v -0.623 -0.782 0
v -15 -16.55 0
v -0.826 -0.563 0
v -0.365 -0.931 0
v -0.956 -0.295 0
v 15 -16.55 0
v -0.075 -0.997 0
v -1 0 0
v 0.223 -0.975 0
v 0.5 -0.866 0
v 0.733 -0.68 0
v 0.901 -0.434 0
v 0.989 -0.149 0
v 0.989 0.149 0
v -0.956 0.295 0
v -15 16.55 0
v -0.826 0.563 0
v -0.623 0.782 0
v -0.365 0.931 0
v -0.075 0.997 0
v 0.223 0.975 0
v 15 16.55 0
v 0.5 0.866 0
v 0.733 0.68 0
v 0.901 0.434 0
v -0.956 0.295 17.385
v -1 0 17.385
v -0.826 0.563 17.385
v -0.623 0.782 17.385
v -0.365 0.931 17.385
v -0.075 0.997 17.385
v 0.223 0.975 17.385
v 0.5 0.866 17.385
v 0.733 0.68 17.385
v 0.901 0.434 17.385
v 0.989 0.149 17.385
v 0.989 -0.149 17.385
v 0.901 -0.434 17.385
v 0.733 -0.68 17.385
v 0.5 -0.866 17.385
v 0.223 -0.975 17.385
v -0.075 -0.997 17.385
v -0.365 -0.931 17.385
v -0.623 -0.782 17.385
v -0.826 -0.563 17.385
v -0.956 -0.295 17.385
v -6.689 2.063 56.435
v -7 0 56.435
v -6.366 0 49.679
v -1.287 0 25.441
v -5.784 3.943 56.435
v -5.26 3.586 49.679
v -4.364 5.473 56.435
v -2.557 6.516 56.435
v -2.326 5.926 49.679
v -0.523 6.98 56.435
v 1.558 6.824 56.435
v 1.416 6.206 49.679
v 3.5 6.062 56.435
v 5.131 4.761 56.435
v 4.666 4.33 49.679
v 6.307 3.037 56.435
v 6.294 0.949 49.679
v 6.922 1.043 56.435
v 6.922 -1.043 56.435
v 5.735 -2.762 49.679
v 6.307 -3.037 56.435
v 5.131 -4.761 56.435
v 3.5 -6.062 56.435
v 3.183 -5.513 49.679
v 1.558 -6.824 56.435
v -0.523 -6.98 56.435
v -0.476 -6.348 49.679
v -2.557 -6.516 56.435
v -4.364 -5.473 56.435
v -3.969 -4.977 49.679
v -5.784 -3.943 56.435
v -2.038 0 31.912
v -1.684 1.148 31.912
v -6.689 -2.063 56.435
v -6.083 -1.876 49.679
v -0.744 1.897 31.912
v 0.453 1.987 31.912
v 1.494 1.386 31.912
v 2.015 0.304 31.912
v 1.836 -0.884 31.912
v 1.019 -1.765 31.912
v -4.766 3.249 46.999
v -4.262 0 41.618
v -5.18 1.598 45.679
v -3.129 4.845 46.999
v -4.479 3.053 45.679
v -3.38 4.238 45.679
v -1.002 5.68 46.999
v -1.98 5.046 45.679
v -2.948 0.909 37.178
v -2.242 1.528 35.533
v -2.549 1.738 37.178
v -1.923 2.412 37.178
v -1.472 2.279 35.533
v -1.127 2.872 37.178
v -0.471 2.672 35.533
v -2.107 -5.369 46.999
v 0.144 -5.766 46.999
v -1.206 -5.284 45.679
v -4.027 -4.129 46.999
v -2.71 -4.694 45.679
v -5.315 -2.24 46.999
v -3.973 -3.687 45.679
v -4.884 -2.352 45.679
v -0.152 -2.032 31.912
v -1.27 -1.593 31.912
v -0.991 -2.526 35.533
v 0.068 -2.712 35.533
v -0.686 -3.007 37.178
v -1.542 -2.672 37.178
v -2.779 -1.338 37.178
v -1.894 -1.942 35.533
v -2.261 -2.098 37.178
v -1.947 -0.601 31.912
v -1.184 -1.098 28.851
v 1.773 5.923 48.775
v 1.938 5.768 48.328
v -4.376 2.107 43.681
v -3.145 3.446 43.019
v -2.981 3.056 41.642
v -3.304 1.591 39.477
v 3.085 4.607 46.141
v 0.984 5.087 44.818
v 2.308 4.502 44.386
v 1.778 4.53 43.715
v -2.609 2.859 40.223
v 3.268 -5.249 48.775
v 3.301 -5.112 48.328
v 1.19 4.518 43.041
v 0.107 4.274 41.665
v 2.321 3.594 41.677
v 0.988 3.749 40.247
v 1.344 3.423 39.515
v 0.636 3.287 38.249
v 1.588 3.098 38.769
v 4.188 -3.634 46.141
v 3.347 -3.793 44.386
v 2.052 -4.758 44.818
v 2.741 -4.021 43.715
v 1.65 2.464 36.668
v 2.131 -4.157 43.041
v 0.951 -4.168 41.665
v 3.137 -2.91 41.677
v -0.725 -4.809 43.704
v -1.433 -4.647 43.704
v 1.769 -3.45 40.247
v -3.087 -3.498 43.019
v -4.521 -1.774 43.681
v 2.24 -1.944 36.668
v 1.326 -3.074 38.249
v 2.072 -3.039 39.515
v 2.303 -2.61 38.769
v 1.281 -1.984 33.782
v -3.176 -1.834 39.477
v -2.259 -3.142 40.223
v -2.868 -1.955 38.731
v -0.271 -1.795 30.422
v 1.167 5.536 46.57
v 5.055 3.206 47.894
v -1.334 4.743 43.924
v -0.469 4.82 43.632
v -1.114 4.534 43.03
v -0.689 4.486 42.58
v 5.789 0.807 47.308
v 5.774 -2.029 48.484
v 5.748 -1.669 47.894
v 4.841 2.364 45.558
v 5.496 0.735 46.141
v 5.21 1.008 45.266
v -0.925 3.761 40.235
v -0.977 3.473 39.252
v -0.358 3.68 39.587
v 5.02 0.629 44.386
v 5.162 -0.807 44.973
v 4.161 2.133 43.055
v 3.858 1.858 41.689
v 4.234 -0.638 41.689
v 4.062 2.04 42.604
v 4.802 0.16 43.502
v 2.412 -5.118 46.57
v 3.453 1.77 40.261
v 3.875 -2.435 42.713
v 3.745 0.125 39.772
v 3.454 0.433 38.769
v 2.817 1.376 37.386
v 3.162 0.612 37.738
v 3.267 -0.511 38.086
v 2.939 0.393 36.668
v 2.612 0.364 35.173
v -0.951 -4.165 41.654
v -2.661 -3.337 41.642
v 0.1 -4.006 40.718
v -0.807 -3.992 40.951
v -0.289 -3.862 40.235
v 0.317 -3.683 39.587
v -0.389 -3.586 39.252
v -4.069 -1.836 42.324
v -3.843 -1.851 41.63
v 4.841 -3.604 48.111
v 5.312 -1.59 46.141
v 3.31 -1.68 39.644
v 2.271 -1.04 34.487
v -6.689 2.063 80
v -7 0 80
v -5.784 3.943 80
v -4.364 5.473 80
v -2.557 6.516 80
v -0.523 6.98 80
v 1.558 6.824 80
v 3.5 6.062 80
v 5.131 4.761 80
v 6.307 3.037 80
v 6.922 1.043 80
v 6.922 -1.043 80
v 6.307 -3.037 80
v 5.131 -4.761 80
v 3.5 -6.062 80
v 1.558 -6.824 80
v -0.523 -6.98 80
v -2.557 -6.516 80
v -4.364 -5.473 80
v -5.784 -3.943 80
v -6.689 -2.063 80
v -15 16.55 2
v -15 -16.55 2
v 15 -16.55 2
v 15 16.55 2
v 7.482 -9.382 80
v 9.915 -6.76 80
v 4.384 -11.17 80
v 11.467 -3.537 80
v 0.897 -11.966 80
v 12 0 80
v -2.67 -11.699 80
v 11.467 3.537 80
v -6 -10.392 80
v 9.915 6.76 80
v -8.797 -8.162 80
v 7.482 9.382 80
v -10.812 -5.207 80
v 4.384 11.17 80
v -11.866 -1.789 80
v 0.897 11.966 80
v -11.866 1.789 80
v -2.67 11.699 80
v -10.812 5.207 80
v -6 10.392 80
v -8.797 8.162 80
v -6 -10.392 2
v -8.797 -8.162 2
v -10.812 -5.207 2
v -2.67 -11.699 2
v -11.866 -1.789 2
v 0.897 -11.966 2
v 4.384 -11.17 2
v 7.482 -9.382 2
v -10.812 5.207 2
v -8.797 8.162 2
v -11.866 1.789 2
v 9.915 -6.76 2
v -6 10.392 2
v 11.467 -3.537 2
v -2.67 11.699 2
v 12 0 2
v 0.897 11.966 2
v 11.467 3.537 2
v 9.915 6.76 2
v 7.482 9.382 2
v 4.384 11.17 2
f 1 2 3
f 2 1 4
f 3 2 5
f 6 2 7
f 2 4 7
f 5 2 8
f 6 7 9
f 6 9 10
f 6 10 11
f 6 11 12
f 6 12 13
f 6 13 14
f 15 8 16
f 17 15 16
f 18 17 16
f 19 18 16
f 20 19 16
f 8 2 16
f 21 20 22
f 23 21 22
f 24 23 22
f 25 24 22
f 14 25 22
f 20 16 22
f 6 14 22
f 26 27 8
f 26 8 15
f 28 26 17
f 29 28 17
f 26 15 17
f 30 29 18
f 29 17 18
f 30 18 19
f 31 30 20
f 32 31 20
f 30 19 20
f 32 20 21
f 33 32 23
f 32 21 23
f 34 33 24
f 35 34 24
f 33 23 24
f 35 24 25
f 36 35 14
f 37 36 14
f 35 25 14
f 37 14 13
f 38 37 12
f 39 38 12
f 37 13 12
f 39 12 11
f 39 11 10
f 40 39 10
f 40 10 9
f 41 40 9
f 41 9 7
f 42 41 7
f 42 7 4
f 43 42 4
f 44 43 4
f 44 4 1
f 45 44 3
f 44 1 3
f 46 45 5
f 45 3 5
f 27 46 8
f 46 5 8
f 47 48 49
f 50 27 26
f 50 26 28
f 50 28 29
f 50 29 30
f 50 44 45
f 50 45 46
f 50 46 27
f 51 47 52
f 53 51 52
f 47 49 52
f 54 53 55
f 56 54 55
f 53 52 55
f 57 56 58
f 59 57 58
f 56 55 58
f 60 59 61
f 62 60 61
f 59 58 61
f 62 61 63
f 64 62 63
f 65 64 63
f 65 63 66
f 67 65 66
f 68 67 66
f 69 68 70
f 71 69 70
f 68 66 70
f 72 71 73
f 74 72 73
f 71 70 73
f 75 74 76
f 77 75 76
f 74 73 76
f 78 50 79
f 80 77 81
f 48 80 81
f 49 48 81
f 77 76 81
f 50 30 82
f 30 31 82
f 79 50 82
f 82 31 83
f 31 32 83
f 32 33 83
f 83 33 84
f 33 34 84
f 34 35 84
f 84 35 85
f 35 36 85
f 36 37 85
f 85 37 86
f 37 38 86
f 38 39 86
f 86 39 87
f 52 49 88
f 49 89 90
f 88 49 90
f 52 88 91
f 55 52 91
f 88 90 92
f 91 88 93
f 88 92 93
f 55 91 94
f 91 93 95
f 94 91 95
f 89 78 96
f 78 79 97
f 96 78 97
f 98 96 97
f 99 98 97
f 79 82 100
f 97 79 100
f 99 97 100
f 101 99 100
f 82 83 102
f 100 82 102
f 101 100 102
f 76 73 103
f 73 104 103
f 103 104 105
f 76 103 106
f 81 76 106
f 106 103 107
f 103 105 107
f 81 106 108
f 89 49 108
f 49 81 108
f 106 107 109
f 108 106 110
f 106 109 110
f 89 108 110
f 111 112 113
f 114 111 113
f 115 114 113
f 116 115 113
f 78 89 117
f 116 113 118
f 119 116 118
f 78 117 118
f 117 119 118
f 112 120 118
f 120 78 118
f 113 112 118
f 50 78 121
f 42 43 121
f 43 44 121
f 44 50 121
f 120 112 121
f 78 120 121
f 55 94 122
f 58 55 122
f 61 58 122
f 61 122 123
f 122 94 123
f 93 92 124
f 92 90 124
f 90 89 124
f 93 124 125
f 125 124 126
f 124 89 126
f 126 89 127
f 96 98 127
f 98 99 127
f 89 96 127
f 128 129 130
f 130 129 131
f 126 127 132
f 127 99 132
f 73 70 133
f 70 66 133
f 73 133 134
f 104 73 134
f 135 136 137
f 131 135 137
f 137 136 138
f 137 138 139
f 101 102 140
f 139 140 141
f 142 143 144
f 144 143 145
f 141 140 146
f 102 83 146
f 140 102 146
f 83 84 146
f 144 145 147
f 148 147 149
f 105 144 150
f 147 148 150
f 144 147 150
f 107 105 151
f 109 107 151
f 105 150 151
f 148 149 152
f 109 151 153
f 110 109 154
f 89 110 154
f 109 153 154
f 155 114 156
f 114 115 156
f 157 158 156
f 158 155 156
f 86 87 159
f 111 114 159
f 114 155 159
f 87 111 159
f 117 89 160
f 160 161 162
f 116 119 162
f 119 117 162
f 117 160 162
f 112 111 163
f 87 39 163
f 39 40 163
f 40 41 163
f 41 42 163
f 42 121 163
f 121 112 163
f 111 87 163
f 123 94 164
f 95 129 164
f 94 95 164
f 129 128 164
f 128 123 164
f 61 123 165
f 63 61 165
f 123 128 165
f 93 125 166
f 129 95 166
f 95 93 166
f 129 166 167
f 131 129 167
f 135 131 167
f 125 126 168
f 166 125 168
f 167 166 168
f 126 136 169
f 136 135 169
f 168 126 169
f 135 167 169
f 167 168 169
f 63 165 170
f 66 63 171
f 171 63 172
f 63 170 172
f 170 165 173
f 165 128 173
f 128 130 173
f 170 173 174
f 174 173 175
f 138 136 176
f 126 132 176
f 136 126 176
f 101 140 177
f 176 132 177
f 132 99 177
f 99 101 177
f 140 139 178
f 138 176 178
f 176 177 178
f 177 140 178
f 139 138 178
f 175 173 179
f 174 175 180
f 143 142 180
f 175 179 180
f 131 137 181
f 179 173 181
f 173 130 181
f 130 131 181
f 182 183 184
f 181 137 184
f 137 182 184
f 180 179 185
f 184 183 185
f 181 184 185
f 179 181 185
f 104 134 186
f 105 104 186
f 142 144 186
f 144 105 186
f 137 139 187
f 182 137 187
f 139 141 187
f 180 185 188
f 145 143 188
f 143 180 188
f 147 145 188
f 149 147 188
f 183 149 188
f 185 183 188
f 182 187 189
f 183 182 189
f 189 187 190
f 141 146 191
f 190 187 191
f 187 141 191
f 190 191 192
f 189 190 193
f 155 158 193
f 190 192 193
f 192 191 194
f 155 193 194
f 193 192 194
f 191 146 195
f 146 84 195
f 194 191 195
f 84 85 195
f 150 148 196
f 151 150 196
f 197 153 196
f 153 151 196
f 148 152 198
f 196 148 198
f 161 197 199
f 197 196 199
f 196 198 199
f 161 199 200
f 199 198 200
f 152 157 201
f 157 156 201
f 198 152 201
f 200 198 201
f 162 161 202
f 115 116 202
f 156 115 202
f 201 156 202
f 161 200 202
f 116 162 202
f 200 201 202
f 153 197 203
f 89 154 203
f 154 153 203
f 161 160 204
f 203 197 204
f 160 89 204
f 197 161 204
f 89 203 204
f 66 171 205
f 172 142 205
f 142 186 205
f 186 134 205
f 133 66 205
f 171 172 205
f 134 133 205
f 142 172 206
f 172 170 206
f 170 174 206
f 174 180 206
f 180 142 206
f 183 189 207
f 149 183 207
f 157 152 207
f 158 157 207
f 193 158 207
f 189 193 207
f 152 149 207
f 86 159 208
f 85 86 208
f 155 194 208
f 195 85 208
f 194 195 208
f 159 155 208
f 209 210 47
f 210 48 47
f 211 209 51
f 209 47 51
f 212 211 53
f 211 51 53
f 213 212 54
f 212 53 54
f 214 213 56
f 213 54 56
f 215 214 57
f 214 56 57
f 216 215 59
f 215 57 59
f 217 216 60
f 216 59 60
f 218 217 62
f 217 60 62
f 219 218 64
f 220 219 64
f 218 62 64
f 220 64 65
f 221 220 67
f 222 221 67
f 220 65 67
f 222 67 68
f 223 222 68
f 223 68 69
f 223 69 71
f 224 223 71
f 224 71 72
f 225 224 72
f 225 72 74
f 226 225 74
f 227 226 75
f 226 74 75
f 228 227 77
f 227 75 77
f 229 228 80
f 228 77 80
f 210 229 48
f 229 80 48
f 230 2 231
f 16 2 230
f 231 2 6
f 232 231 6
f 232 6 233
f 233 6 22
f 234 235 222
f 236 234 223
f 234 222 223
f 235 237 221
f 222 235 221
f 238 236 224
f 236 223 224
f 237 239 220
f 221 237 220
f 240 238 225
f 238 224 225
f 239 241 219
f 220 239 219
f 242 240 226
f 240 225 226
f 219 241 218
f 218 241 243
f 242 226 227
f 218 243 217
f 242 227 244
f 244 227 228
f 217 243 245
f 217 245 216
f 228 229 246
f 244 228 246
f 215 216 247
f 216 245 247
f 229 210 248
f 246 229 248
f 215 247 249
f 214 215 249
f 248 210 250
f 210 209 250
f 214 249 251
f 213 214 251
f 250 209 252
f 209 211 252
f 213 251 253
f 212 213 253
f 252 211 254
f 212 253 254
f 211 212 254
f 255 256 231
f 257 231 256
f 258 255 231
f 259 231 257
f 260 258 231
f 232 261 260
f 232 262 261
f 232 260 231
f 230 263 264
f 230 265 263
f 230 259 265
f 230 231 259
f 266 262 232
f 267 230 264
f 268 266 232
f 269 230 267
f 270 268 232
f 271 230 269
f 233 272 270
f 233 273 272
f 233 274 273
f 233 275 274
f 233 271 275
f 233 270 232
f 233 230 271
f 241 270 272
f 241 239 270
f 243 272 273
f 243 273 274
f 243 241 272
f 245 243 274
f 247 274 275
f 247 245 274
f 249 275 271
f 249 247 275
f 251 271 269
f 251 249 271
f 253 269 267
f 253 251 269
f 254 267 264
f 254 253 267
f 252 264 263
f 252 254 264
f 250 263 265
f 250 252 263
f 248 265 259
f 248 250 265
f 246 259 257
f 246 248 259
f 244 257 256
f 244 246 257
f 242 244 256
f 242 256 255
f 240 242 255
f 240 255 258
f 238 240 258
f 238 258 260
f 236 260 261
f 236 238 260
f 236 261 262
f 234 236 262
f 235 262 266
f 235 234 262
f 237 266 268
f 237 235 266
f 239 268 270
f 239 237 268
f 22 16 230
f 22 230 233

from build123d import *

# Parameters (mm, degrees)
F0_W     = 30
F0_H     = 33.1
F1_DEPTH = 2
F2_W     = 12
F2_H     = 78


with BuildPart() as f1:
    # F0 (on Top) → F1 (new body)
    with BuildSketch(Plane.XY):
        Rectangle(F0_W, F0_H)
    extrude(amount=F1_DEPTH)

    # F2 (on Front) → F3 (revolve)
    with BuildSketch(Plane.XZ):
        with Locations((6, 41)):
            Rectangle(F2_W, F2_H)
    revolve(axis=Axis((0, 0, 40), (0, 0, 1)))

    # F4 (on Front) → F5 (revolve, cut)
    with BuildSketch(Plane.XZ):
        with BuildLine():
            Line((0, 0), (0, 80))
            Line((0, 80), (-7, 80))
            Line((-7, 80), (-7, 56.435473))
            add(Edge.make_bspline(
                [(-7, 56.435473), (-7, 43.904641), (-1, 40), (-1, 17.385136)],
                knots=[0, 0, 0, 0, 39.508592, 39.508592, 39.508592, 39.508592], degree=3))
            Line((-1, 17.385136), (-1, 0))
            Line((-1, 0), (0, 0))
        make_face()
    revolve(axis=Axis((0, 0, 40), (0, 0, -1)), mode=Mode.SUBTRACT)


solid = f1.part
